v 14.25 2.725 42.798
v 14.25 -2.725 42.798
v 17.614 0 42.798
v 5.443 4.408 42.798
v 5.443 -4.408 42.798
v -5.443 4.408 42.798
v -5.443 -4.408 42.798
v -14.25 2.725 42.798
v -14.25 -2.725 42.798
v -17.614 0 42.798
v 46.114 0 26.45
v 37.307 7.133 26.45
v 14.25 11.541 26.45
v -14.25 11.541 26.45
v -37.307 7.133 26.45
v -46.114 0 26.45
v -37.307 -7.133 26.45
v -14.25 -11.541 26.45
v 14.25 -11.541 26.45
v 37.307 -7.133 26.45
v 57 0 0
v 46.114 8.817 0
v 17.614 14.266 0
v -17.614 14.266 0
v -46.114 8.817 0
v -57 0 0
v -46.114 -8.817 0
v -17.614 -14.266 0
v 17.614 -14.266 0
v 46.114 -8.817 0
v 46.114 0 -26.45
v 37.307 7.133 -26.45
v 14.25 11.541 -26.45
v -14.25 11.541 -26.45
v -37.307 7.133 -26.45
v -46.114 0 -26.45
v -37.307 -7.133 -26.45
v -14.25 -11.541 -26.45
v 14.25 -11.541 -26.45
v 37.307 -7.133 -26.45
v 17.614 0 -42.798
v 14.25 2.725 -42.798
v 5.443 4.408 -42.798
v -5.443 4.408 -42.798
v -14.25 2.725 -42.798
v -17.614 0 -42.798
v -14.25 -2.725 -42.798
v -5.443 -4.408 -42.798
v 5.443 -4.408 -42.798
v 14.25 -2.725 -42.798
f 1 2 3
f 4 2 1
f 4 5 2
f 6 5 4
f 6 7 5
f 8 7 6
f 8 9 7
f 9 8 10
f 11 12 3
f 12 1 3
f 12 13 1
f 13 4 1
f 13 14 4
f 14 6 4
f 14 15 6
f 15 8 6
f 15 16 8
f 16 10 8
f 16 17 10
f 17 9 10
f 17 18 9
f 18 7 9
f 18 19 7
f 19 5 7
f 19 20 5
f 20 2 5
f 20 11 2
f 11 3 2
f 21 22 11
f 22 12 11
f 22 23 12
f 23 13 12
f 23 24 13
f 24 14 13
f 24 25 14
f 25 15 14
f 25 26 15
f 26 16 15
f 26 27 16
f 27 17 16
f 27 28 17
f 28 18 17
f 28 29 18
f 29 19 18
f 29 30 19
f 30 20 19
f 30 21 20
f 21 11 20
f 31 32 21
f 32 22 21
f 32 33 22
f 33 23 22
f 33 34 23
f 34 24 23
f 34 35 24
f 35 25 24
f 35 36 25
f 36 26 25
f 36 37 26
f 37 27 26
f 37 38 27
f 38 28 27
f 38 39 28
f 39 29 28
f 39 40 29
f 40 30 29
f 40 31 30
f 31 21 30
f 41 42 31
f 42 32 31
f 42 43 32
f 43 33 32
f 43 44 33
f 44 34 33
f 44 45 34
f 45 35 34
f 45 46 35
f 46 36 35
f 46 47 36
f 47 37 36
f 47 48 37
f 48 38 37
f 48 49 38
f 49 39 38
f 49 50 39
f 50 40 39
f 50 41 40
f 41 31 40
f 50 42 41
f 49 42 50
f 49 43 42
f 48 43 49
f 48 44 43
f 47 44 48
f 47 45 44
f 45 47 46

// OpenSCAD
// Generated by SolidPython 1.0.1 on 2020-07-29 00:46:53


scale(v = [19, 5, 15]) {
	sphere(r = 3);
}
/***********************************************
*********      SolidPython code:      **********
************************************************
 
# import packages: SolidPython
from solid import *
from solid.utils import *
from itertools import chain, combinations, permutations


class Resize:

    def __init__(self, scad_file):
        self.scad_file = scad_file
        #self.scad_file = import_scad(scad_file)
        # cone/cylinder param:
        self.r1 = 0
        self.r2 = 0
        self.h = 0
        # rectangular prism param:
        self.w = 0
        self.l = 0
        # ellipse param:
        self.r = 0

    # import OpenScad code (file name corresponds to shape)


    # classify shape + parameters
    def assign(self, param1, param2, param3):
        if self.scad_file == 'cone.scad':
            self.r1 = param1
            self.r2 = param2
            self.h = param3
        elif self.scad_file == 'cylinder.scad':
            self.r1 = param1
            self.r2 = param2
            self.h = param3
        elif self.scad_file == 'rectangularPrism.scad':
            self.h = param1
            self.l = param2
            self.w = param3
        else:
            self.r = param1
            self.h = param2

    # resize parameters
    def iterate(self):
        x = range(3, 20, 2)
        i = 1
        if self.scad_file == 'cone.scad':
            tempList = list(permutations(x, 2))
            for temp in tempList:
                param1 = temp[0]
                param2 = temp[1]
                filepath = 'produced_scad_files/' + 'cone' + str(param1) + '_' + str(param2) + '_' + '.scad'
                scad_render_to_file(cylinder(h=param1, r1=param2, r2=0), filepath)

        elif self.scad_file == 'cylinder.scad':
            tempList = list(permutations(x, 3))
            for temp in tempList:
                param1 = temp[0]
                param2 = temp[1]
                filepath = 'produced_scad_files/' + 'cylinder' + str(param1) + '_' + str(param2) + '_' + '.scad'
                scad_render_to_file(cylinder(h=param1, r1=param2, r2=param2), filepath)

        elif self.scad_file == 'rectangularPrism.scad':
            tempList = list(permutations(x, 3))
            for temp in tempList:
                param1 = temp[0]
                param2 = temp[1]
                param3 = temp[2]
                filepath = 'produced_scad_files/' + 'rectangularPrism' + str(param1) + '_' + str(param2) + '_' + str(
                    param3) + '.scad'
                scad_render_to_file(cube(size=(param1, param2, param3)), filepath)

        elif self.scad_file == 'ellipse.scad':
            tempList = list(permutations(x, 4))
            for temp in tempList:
                param1 = temp[0]
                param2 = temp[1]
                param3 = temp[2]
                param4 = temp[3]
                filepath = 'produced_scad_files/' + 'ellipse' + str(param1) + '_' + str(param2) + '_' + str(param3) + '_' + str(param4) + '.scad'
                scad_render_to_file(scale([param1, param2, param3])(sphere(r=param4)), filepath)

    def render_to_scadfile(self):
        scad_render_to_file(scad, 'example.scad') 
 
************************************************/
